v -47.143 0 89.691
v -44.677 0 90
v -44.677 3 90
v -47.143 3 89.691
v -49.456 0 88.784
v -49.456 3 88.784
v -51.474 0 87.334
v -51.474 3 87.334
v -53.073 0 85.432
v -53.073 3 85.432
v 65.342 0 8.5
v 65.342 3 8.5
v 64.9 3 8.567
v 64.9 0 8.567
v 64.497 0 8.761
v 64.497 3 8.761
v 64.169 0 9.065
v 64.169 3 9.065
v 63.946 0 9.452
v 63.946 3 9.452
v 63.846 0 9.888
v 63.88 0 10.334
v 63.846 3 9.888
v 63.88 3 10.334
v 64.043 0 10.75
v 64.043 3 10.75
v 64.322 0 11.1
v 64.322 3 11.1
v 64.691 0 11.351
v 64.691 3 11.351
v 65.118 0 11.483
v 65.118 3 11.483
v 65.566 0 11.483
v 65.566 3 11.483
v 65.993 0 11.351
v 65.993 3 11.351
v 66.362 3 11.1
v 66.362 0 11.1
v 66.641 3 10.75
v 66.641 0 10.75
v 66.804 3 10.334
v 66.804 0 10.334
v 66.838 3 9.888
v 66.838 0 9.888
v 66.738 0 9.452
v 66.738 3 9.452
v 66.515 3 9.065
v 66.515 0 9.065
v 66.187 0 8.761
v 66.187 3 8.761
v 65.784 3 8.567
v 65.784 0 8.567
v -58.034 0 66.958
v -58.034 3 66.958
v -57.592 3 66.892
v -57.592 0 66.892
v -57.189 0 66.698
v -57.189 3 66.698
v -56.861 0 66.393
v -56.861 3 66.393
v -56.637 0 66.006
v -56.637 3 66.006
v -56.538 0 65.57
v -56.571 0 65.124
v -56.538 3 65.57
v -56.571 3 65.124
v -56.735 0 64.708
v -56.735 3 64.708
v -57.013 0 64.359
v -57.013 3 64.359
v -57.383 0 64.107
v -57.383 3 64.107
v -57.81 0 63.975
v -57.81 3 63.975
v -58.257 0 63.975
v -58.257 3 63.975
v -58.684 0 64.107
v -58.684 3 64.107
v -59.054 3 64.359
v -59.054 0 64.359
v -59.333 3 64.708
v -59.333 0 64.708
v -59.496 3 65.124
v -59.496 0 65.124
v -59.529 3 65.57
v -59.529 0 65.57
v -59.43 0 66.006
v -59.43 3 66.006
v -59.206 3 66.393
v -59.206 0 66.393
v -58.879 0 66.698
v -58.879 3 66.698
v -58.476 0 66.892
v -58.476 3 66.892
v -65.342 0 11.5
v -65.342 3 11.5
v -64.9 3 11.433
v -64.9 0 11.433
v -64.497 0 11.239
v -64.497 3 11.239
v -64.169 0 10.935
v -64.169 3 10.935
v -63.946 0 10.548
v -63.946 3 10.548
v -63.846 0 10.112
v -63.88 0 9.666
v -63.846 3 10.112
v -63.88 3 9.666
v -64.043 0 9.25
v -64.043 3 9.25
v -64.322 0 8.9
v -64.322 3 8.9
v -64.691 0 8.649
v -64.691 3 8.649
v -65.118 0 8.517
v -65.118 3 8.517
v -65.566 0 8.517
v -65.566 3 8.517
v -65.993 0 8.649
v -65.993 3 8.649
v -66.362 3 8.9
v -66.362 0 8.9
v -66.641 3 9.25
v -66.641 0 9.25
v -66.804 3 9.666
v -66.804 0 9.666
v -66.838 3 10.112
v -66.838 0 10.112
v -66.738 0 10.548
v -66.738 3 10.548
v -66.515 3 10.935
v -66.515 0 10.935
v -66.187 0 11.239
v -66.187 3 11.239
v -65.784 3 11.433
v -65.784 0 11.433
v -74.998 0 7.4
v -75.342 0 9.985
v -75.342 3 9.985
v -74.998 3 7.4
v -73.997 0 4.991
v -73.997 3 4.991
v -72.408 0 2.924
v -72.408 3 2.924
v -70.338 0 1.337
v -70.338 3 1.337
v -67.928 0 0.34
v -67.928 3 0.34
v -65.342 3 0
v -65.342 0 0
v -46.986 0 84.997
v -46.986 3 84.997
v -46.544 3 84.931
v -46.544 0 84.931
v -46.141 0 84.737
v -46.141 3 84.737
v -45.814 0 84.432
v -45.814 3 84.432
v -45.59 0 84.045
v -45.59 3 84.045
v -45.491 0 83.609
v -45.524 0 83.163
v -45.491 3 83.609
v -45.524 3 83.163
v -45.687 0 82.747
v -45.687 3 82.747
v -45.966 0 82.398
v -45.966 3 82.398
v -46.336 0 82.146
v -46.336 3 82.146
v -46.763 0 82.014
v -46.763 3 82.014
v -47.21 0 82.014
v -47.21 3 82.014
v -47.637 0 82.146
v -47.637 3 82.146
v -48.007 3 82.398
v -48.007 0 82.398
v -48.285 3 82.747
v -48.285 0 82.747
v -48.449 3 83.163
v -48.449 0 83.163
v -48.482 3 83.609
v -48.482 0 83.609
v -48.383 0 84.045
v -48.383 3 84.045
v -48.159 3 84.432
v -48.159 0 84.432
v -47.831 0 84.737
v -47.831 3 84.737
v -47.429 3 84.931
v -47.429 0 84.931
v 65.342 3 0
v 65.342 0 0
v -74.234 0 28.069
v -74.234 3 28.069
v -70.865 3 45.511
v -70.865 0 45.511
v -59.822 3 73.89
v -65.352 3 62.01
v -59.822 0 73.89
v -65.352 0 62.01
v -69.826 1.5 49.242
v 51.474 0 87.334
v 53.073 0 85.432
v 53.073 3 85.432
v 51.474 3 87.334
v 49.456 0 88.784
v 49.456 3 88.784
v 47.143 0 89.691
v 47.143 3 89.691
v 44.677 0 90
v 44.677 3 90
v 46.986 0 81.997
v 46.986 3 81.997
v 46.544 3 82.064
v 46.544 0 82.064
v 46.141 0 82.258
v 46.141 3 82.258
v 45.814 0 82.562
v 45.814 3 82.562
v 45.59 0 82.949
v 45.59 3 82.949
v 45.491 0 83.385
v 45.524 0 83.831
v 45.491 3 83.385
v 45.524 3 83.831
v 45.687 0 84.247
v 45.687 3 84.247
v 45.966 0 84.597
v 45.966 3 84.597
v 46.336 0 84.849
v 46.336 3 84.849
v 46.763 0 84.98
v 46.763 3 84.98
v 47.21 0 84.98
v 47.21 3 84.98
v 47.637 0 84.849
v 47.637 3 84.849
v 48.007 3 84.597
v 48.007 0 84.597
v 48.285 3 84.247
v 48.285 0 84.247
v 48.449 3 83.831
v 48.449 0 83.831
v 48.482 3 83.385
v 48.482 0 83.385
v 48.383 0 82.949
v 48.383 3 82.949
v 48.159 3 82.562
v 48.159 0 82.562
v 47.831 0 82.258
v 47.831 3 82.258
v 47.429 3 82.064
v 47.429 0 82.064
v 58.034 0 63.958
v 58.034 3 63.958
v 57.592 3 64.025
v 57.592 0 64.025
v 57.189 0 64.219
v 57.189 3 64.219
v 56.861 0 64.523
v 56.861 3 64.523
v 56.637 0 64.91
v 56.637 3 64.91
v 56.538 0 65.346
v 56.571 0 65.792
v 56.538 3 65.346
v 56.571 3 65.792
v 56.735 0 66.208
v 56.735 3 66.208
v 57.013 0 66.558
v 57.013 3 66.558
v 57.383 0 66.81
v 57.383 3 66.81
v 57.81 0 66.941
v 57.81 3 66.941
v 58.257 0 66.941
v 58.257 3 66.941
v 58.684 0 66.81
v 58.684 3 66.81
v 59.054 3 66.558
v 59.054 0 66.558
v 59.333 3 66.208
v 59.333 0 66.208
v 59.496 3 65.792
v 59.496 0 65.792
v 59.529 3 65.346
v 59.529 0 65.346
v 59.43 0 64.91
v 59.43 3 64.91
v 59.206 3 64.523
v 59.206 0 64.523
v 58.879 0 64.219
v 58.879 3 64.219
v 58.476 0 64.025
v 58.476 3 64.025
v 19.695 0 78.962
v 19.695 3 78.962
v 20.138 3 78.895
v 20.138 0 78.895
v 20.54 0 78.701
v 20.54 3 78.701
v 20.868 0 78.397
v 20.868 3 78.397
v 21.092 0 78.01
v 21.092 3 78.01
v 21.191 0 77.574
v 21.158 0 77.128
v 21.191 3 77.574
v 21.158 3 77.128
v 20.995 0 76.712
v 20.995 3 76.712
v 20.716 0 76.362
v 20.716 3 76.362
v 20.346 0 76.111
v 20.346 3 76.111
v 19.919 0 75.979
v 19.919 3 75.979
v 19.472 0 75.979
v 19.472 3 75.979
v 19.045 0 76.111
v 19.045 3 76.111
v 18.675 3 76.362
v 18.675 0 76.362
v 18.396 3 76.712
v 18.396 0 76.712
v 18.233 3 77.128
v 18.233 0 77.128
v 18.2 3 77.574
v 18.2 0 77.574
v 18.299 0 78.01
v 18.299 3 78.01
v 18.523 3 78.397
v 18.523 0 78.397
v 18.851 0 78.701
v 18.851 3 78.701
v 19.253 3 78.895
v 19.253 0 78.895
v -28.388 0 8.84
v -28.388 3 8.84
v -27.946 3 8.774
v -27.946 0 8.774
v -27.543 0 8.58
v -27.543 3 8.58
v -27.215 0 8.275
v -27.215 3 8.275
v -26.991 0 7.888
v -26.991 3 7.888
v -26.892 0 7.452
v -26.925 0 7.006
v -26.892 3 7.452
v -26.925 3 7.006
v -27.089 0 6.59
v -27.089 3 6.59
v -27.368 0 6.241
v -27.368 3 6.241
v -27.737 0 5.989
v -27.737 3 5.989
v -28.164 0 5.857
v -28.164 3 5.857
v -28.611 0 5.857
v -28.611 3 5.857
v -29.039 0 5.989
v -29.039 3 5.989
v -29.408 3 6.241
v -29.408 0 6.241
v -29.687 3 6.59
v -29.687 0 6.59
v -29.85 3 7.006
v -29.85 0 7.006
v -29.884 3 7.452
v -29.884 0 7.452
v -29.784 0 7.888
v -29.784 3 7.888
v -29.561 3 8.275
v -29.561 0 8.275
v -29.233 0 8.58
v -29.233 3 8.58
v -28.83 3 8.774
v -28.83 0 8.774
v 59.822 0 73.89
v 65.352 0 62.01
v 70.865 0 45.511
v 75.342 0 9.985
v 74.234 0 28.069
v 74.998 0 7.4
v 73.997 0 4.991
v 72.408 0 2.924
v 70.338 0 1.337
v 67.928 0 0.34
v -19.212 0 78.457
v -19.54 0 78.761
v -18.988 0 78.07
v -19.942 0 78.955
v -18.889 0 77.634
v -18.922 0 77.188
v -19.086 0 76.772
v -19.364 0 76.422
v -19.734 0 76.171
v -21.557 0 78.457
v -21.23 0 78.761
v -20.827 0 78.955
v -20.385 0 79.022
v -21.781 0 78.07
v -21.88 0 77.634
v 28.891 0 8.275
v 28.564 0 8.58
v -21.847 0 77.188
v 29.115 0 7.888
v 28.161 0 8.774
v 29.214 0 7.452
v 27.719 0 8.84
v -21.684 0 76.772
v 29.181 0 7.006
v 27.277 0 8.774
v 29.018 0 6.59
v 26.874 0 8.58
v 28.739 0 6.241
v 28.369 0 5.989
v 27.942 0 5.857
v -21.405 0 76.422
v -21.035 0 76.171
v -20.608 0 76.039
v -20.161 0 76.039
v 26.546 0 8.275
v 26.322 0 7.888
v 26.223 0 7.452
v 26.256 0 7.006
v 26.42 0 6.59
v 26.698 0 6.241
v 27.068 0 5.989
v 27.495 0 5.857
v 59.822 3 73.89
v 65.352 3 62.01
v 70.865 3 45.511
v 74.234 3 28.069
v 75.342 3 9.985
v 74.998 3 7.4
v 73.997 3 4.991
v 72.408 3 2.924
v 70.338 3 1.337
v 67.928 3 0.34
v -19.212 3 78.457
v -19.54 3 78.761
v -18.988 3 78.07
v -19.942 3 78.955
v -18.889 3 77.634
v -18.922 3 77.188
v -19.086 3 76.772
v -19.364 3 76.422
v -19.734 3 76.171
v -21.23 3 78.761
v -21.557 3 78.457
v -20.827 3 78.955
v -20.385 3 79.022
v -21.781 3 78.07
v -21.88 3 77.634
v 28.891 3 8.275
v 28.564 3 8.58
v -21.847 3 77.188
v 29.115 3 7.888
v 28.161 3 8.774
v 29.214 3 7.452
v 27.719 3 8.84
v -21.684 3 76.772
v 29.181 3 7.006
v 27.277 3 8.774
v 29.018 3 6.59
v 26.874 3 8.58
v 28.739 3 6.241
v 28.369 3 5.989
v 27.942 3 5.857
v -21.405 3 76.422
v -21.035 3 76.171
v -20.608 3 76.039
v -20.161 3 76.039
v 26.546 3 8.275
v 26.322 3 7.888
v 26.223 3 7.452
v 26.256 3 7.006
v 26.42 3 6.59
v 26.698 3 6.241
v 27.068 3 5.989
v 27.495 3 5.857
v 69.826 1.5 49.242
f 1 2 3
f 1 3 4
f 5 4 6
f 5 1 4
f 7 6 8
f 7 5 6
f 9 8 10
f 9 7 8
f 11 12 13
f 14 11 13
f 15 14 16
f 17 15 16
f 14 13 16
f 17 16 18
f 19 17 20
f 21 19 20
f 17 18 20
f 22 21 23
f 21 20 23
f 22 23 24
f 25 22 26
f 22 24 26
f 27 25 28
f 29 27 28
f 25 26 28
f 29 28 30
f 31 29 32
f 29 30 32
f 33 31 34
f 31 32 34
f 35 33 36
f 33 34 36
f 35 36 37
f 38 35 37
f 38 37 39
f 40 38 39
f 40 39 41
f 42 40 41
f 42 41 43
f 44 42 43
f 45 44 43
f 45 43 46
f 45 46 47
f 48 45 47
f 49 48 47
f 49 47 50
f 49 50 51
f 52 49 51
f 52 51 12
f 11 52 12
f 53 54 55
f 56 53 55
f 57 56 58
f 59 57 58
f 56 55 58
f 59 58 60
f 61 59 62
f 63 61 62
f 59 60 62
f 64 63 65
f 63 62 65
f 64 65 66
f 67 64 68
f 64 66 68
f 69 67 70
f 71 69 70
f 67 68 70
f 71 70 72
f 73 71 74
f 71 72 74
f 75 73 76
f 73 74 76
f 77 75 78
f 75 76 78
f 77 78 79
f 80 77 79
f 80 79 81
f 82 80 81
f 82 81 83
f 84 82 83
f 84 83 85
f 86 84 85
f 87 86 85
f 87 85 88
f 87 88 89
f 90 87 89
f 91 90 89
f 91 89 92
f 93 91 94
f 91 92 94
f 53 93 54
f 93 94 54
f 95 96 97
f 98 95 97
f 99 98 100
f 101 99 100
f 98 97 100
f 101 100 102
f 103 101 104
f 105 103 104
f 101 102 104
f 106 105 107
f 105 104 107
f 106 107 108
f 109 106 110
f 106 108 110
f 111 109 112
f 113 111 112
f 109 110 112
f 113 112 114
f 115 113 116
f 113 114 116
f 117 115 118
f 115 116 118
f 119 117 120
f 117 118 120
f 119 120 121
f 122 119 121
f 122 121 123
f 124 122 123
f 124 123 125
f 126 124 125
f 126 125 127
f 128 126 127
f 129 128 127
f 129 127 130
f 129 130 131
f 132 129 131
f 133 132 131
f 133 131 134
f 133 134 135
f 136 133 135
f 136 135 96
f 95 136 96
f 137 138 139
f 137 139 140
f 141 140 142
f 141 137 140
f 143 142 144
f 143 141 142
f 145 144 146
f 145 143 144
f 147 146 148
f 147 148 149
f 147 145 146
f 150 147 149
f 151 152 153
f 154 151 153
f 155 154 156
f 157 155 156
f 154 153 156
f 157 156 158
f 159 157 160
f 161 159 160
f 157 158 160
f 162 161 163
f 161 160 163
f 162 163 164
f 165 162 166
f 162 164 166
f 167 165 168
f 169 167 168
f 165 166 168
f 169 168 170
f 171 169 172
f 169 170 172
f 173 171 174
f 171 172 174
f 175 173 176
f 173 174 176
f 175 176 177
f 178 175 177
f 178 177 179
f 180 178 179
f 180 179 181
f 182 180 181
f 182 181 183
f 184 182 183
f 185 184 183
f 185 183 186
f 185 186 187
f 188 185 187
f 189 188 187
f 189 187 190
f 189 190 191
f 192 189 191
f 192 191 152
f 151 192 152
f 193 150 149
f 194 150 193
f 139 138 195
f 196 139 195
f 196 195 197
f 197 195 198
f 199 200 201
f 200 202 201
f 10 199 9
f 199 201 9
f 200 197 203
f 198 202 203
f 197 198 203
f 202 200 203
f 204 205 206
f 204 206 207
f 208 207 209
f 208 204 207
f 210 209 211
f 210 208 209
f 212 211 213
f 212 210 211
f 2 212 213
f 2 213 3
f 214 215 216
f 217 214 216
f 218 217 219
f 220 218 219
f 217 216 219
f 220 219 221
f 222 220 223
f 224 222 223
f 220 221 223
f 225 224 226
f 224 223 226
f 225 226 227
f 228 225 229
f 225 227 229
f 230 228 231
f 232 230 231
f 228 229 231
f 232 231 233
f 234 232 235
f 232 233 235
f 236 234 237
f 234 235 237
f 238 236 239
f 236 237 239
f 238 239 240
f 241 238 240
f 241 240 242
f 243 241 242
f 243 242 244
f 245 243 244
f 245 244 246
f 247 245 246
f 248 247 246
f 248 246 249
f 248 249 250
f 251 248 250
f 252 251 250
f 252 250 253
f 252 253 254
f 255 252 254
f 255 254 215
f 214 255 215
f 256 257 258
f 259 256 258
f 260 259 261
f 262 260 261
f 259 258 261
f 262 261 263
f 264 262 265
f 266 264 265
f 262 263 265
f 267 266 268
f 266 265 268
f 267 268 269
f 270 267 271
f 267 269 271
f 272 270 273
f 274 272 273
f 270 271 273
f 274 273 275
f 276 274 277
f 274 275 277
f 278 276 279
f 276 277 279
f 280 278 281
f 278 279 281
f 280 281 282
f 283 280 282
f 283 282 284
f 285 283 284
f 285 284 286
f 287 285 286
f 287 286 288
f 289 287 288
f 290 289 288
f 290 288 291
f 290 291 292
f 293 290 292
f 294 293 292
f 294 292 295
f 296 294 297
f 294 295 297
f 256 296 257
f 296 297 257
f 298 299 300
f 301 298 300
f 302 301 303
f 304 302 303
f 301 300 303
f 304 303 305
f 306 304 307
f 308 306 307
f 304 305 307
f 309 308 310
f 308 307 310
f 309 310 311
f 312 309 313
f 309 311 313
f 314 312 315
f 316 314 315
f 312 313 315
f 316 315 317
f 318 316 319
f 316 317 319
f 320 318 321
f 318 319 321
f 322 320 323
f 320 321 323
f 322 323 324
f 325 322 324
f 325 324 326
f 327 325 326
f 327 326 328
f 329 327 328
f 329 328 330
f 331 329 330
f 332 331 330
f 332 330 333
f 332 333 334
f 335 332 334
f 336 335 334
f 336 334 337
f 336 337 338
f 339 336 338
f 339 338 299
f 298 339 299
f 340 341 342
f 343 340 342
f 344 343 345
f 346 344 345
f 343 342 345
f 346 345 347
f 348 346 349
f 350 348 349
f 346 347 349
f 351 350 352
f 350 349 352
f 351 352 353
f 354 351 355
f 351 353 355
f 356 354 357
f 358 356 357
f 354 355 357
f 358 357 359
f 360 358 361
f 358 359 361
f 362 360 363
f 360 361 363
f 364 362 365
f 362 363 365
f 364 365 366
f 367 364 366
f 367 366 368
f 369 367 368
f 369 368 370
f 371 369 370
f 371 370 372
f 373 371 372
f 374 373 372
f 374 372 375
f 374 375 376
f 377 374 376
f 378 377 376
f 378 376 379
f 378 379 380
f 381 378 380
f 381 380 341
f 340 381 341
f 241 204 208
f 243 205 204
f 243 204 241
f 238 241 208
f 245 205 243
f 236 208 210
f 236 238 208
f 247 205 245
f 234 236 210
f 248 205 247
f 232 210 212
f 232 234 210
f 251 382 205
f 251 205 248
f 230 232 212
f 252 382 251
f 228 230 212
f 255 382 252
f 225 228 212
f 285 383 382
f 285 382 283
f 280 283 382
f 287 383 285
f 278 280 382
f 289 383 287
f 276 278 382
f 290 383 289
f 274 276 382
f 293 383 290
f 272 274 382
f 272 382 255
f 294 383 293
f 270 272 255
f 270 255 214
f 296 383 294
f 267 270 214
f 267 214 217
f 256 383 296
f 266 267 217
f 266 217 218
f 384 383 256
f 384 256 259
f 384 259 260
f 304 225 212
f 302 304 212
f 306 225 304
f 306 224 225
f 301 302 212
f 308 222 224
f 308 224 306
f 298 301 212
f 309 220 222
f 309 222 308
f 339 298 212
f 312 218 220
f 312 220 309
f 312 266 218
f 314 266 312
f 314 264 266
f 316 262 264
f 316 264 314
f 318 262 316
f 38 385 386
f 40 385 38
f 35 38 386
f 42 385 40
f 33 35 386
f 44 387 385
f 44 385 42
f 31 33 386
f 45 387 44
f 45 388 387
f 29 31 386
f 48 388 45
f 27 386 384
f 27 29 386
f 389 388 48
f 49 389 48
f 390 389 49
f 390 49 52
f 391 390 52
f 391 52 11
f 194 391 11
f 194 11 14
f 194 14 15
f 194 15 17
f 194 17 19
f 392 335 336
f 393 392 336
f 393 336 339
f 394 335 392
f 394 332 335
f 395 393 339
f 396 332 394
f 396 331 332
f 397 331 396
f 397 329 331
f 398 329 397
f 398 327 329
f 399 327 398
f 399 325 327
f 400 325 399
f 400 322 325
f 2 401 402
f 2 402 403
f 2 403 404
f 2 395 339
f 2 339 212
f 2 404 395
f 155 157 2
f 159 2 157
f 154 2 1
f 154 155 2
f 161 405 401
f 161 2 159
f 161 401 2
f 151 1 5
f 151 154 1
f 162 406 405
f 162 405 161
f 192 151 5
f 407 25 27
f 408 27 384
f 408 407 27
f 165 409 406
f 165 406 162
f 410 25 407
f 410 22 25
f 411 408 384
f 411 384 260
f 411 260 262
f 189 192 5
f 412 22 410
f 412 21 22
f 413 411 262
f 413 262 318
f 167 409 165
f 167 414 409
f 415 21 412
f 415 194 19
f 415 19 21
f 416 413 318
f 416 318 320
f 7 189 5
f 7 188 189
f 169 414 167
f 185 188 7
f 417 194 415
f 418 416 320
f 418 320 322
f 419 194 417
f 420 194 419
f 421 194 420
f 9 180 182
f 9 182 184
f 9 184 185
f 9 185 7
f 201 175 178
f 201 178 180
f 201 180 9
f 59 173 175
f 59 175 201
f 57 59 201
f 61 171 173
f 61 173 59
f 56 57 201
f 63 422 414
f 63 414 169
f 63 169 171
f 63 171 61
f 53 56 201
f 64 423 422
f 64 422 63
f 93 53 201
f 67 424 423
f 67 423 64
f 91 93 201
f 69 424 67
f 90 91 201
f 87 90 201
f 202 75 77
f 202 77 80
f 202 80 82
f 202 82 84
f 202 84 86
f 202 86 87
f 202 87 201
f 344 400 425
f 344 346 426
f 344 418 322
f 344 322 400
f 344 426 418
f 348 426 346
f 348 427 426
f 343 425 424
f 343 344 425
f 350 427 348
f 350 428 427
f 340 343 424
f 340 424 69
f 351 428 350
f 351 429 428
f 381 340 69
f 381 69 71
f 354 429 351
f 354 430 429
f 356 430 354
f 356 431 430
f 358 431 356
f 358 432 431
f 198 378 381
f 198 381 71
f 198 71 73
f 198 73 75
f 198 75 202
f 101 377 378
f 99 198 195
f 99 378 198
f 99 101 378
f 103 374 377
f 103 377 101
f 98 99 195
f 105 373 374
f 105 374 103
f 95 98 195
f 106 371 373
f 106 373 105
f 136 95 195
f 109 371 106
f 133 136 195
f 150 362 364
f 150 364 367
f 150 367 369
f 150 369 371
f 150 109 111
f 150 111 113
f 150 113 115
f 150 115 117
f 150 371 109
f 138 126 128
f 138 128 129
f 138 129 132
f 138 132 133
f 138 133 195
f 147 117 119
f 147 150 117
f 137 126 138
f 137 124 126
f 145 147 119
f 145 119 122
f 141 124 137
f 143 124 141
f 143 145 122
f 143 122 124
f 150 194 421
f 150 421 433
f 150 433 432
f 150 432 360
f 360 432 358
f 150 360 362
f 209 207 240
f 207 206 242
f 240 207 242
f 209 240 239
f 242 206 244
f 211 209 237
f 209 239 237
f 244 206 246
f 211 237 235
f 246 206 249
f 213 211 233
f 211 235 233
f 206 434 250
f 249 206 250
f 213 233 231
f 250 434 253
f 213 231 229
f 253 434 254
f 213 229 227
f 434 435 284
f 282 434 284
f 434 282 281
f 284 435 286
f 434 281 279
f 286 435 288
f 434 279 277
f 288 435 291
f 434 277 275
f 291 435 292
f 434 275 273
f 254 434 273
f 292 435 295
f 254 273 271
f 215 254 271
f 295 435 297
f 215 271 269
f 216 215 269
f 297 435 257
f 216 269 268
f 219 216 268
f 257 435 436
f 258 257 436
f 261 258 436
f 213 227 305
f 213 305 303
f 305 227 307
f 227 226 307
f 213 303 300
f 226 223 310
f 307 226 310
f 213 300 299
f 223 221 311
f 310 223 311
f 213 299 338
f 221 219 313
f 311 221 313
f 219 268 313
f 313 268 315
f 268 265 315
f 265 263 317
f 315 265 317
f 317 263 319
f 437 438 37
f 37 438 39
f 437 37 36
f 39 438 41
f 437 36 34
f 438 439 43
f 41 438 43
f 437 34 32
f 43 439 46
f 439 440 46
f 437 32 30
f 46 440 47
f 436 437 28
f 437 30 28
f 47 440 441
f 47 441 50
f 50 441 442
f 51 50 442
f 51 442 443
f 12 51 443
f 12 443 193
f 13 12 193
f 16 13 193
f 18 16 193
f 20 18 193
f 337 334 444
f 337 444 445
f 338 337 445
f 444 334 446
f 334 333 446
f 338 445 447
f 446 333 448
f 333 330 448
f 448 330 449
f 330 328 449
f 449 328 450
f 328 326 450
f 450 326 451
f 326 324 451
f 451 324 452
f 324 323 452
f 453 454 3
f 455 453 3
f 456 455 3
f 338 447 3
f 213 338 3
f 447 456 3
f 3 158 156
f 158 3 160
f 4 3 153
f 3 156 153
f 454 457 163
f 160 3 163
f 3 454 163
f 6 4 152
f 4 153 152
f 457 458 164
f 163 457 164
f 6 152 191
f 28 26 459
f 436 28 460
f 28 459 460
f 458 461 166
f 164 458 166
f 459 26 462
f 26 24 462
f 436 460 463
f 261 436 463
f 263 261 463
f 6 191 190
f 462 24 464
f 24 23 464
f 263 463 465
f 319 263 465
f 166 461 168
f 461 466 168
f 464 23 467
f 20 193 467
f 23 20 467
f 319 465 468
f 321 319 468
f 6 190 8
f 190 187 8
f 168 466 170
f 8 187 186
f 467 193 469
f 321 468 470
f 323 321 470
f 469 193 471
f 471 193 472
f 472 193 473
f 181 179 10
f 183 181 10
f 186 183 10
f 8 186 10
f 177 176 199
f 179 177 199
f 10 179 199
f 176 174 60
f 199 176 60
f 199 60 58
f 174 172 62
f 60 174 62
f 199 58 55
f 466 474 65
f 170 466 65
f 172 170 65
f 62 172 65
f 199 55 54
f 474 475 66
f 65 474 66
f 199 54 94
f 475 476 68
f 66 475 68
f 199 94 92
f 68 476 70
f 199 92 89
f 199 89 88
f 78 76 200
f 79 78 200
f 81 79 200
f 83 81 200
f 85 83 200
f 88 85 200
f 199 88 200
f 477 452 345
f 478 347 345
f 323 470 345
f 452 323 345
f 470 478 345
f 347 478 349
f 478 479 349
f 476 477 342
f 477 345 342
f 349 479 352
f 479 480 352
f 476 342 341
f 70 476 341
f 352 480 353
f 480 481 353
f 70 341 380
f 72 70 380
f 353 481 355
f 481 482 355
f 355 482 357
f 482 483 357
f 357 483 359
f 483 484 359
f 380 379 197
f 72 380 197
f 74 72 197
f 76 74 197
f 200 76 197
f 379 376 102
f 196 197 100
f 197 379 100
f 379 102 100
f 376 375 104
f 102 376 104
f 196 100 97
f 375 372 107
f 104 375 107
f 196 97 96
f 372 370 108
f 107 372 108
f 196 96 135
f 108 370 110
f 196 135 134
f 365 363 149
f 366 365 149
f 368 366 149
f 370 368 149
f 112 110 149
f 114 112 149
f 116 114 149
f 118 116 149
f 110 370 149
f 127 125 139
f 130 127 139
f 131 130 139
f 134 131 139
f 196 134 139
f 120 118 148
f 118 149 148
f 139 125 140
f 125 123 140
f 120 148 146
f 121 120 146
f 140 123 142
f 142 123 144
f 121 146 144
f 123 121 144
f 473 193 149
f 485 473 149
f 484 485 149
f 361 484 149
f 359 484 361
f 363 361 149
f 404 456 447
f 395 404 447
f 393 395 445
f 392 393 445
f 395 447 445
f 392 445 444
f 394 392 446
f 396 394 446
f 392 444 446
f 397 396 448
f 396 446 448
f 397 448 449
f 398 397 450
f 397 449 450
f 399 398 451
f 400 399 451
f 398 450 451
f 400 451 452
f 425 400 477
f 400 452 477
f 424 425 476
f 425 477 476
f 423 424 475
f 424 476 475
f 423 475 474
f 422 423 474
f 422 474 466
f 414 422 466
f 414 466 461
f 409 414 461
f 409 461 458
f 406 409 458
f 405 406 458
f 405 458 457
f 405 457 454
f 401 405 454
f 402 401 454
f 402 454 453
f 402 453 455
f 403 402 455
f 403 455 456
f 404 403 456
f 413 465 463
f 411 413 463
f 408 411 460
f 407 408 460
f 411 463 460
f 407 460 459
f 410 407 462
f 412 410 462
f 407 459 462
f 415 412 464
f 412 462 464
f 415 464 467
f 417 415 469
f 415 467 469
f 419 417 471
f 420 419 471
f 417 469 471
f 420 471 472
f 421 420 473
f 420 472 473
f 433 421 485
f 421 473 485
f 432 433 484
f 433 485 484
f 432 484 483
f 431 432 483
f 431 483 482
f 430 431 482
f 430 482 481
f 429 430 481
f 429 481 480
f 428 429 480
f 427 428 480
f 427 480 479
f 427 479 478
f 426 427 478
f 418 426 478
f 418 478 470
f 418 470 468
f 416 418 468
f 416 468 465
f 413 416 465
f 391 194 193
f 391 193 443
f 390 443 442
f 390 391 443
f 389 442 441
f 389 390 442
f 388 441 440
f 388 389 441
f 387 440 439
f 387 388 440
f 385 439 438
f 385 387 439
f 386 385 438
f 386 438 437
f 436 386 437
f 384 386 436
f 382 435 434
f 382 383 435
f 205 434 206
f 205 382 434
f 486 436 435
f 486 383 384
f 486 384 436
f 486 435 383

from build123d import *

# Parameters (mm, degrees)
EXTRUDE_1_DEPTH     = 3
SKETCH_2_R          = 1.5
CUT_EXTRUDE_1_DEPTH = 10
SKETCH_3_R          = 1.5
CUT_EXTRUDE_2_DEPTH = 10
SKETCH_4_R          = 1.5
CUT_EXTRUDE_3_DEPTH = 3


with BuildPart() as part:
    # 草图1 → 凸台-拉伸1 (new body)
    with BuildSketch(Plane(origin=(0, 0, 0), x_dir=(1, 0, 0), z_dir=(0, 1, 0))):
        with BuildLine():
            Line((-65.342005187, 0), (65.342005187, 0))
            ThreePointArc((65.342005187, 0), (72.407706971, -2.923570229), (75.341993678, -9.984828338))
            add(Edge.make_bspline(
                [(75.341993678, -9.984828338), (75.362629964, -23.586675416), (71.657087991, -49.894617792), (60.538848208, -73.890924153), (53.072976878, -85.431659706)],
                knots=[0.101765917, 0.101765917, 0.101765917, 0.101765917, 0.521592529, 0.943927148, 0.943927148, 0.943927148, 0.943927148], degree=3))
            ThreePointArc((53.072976878, -85.431659706), (49.456022644, -88.783979652), (44.676723378, -90))
            Line((44.676723378, -90), (-44.676723378, -90))
            ThreePointArc((-44.676723378, -90), (-49.456022644, -88.783979652), (-53.072976878, -85.431659706))
            add(Edge.make_bspline(
                [(-75.341993678, -9.984828338), (-75.362629964, -23.586675416), (-71.657087991, -49.894617792), (-60.538848208, -73.890924153), (-53.072976878, -85.431659706)],
                knots=[0.101765917, 0.101765917, 0.101765917, 0.101765917, 0.521592529, 0.943927148, 0.943927148, 0.943927148, 0.943927148], degree=3))
            ThreePointArc((-75.341993678, -9.984828338), (-72.407706971, -2.923570229), (-65.342005187, 0))
        make_face()
    extrude(amount=EXTRUDE_1_DEPTH)

    # 草图2 → 切除-拉伸1 (cut)
    with BuildSketch(Plane(origin=(0, 3, 0), x_dir=(1, 0, 0), z_dir=(0, 1, 0))):
        with Locations(Location((-65.342005187, -10, 0), (0, 0, 270))):
            Circle(SKETCH_2_R)
        with Locations(Location((-46.986453842, -83.497243756, 0), (0, 0, 270))):
            Circle(SKETCH_2_R)
        with Locations(Location((46.986453842, -83.497243756, 0), (0, 0, 90))):
            Circle(SKETCH_2_R)
        with Locations(Location((65.342005187, -10, 0), (0, 0, 90))):
            Circle(SKETCH_2_R)
    extrude(amount=-CUT_EXTRUDE_1_DEPTH, mode=Mode.SUBTRACT)

    # 草图3 → 切除-拉伸2 (cut)
    with BuildSketch(Plane(origin=(0, 3, 0), x_dir=(1, 0, 0), z_dir=(0, 1, 0))):
        with Locations(Location((-28.387774848, -7.340263553, 0), (0, 0, 270))):
            Circle(SKETCH_3_R)
        with Locations(Location((27.718646552, -7.340263553, 0), (0, 0, 270))):
            Circle(SKETCH_3_R)
        with Locations(Location((19.695499635, -77.462033559, 0), (0, 0, 270))):
            Circle(SKETCH_3_R)
        with Locations(Location((-20.384564295, -77.521997213, 0), (0, 0, 270))):
            Circle(SKETCH_3_R)
    extrude(amount=-CUT_EXTRUDE_2_DEPTH, mode=Mode.SUBTRACT)

    # 草图4 → 切除-拉伸3 (cut)
    with BuildSketch(Plane(origin=(0, 3, 0), x_dir=(1, 0, 0), z_dir=(0, 1, 0))):
        with Locations(Location((-58.033655971, -65.458214846, 0), (0, 0, 270))):
            Circle(SKETCH_4_R)
        with Locations(Location((58.033655971, -65.458214846, 0), (0, 0, 90))):
            Circle(SKETCH_4_R)
    extrude(amount=-CUT_EXTRUDE_3_DEPTH, mode=Mode.SUBTRACT)


solid = part.part
